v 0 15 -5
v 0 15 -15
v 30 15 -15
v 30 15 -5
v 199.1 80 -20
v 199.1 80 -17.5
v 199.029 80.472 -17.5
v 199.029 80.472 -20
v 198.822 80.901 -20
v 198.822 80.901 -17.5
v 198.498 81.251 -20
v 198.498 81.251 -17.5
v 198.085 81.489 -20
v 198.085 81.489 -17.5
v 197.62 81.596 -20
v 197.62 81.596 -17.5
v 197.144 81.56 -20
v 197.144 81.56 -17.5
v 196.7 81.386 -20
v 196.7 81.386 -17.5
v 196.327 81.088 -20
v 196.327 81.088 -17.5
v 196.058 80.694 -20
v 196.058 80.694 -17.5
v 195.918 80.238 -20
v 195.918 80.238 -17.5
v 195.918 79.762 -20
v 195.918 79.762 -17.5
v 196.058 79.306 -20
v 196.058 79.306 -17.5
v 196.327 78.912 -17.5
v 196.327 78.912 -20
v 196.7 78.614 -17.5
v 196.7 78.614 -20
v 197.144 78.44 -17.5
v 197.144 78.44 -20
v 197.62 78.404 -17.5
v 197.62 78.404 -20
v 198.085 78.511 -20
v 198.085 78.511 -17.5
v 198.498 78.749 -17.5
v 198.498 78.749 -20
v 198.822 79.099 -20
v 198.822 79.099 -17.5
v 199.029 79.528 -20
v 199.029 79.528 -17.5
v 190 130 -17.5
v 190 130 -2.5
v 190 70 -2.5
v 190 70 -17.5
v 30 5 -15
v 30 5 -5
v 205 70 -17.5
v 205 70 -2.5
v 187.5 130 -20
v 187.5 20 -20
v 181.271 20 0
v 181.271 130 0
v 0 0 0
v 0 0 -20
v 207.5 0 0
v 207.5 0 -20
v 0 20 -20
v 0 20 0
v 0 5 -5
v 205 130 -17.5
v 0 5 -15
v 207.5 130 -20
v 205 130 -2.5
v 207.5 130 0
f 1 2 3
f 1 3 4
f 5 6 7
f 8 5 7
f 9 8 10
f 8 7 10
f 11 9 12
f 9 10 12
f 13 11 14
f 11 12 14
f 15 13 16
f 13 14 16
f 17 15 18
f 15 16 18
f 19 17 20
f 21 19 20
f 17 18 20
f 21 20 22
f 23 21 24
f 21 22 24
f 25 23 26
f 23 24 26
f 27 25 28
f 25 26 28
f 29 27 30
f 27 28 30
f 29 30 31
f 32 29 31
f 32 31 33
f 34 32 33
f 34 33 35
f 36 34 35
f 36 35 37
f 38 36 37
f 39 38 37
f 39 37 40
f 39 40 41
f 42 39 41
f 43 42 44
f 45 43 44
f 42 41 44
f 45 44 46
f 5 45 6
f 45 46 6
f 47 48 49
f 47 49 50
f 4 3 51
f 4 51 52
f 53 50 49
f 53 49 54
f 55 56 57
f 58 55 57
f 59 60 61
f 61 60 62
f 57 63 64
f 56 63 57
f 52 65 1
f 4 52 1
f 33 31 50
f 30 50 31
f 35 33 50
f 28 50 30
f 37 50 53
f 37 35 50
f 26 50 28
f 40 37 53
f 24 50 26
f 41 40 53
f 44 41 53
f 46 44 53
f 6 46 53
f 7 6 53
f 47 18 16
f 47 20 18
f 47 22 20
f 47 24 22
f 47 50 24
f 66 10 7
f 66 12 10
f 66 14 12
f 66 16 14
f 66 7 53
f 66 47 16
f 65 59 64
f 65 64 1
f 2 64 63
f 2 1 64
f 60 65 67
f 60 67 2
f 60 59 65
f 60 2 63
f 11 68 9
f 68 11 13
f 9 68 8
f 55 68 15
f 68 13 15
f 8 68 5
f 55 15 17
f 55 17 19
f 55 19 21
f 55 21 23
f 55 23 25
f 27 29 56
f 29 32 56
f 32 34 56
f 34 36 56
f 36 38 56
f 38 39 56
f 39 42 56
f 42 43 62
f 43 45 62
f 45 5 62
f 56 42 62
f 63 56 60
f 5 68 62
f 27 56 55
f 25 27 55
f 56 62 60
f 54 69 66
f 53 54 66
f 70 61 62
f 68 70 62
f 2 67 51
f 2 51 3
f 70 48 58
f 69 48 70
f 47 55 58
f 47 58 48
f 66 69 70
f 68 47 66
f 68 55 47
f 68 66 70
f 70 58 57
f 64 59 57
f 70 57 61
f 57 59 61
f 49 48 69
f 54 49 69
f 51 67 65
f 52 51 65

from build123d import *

# Parameters (mm, degrees)
ESQUISSE1_W             = 207.5
ESQUISSE1_H             = 20
BOSS_EXTRU_1_DEPTH      = 20
BOSS_EXTRU_2_DEPTH      = 110
ESQUISSE3_W             = 10
ESQUISSE3_H             = 10
ENL_V_MAT_EXTRU_1_DEPTH = 30
D_GAGEMENT_M31_D        = 3.2
D_GAGEMENT_M31_DEPTH    = 10
D_GAGEMENT_M31_TIP      = 0.96137699
ESQUISSE6_W             = 15
ESQUISSE6_H             = 15
ENL_V_MAT_EXTRU_2_DEPTH = 60


with BuildPart() as part:
    # Esquisse1 → Boss.-Extru.1 (new body)
    with BuildSketch(Plane(origin=(0, 0, 0), x_dir=(1, 0, 0), z_dir=(0, 1, 0))):
        with Locations((103.75, 10)):
            Rectangle(ESQUISSE1_W, ESQUISSE1_H)
    extrude(amount=BOSS_EXTRU_1_DEPTH)

    # Esquisse2 → Boss.-Extru.2 (add)
    with BuildSketch(Plane(origin=(0, 20, 0), x_dir=(1, 0, 0), z_dir=(0, 1, 0))):
        Polygon((207.5, 20), (187.5, 20), (181.270693681, 0), (207.5, 0), align=None)
    extrude(amount=BOSS_EXTRU_2_DEPTH)

    # Esquisse3 → Enlèv. mat.-Extru.1 (cut)
    with BuildSketch(Plane.ZY):
        with Locations((-10, 10)):
            Rectangle(ESQUISSE3_W, ESQUISSE3_H)
    extrude(amount=-ENL_V_MAT_EXTRU_1_DEPTH, mode=Mode.SUBTRACT)

    # Dégagement M31
    with Locations(Plane(origin=(0, 0, -20), x_dir=(-1, 0, 0), z_dir=(0, 0, -1))):
        with Locations((-197.5, 80)):
            Hole(D_GAGEMENT_M31_D / 2, depth=D_GAGEMENT_M31_DEPTH)
            with Locations((0, 0, -(D_GAGEMENT_M31_DEPTH + D_GAGEMENT_M31_TIP / 2))):  # 118° drill point
                Cone(0, D_GAGEMENT_M31_D / 2, D_GAGEMENT_M31_TIP, mode=Mode.SUBTRACT)

    # Esquisse6 → Enlèv. mat.-Extru.2 (cut)
    with BuildSketch(Plane(origin=(0, 130, 0), x_dir=(1, 0, 0), z_dir=(0, 1, 0))):
        with Locations((197.5, 10)):
            Rectangle(ESQUISSE6_W, ESQUISSE6_H)
    extrude(amount=-ENL_V_MAT_EXTRU_2_DEPTH, mode=Mode.SUBTRACT)


solid = part.part
